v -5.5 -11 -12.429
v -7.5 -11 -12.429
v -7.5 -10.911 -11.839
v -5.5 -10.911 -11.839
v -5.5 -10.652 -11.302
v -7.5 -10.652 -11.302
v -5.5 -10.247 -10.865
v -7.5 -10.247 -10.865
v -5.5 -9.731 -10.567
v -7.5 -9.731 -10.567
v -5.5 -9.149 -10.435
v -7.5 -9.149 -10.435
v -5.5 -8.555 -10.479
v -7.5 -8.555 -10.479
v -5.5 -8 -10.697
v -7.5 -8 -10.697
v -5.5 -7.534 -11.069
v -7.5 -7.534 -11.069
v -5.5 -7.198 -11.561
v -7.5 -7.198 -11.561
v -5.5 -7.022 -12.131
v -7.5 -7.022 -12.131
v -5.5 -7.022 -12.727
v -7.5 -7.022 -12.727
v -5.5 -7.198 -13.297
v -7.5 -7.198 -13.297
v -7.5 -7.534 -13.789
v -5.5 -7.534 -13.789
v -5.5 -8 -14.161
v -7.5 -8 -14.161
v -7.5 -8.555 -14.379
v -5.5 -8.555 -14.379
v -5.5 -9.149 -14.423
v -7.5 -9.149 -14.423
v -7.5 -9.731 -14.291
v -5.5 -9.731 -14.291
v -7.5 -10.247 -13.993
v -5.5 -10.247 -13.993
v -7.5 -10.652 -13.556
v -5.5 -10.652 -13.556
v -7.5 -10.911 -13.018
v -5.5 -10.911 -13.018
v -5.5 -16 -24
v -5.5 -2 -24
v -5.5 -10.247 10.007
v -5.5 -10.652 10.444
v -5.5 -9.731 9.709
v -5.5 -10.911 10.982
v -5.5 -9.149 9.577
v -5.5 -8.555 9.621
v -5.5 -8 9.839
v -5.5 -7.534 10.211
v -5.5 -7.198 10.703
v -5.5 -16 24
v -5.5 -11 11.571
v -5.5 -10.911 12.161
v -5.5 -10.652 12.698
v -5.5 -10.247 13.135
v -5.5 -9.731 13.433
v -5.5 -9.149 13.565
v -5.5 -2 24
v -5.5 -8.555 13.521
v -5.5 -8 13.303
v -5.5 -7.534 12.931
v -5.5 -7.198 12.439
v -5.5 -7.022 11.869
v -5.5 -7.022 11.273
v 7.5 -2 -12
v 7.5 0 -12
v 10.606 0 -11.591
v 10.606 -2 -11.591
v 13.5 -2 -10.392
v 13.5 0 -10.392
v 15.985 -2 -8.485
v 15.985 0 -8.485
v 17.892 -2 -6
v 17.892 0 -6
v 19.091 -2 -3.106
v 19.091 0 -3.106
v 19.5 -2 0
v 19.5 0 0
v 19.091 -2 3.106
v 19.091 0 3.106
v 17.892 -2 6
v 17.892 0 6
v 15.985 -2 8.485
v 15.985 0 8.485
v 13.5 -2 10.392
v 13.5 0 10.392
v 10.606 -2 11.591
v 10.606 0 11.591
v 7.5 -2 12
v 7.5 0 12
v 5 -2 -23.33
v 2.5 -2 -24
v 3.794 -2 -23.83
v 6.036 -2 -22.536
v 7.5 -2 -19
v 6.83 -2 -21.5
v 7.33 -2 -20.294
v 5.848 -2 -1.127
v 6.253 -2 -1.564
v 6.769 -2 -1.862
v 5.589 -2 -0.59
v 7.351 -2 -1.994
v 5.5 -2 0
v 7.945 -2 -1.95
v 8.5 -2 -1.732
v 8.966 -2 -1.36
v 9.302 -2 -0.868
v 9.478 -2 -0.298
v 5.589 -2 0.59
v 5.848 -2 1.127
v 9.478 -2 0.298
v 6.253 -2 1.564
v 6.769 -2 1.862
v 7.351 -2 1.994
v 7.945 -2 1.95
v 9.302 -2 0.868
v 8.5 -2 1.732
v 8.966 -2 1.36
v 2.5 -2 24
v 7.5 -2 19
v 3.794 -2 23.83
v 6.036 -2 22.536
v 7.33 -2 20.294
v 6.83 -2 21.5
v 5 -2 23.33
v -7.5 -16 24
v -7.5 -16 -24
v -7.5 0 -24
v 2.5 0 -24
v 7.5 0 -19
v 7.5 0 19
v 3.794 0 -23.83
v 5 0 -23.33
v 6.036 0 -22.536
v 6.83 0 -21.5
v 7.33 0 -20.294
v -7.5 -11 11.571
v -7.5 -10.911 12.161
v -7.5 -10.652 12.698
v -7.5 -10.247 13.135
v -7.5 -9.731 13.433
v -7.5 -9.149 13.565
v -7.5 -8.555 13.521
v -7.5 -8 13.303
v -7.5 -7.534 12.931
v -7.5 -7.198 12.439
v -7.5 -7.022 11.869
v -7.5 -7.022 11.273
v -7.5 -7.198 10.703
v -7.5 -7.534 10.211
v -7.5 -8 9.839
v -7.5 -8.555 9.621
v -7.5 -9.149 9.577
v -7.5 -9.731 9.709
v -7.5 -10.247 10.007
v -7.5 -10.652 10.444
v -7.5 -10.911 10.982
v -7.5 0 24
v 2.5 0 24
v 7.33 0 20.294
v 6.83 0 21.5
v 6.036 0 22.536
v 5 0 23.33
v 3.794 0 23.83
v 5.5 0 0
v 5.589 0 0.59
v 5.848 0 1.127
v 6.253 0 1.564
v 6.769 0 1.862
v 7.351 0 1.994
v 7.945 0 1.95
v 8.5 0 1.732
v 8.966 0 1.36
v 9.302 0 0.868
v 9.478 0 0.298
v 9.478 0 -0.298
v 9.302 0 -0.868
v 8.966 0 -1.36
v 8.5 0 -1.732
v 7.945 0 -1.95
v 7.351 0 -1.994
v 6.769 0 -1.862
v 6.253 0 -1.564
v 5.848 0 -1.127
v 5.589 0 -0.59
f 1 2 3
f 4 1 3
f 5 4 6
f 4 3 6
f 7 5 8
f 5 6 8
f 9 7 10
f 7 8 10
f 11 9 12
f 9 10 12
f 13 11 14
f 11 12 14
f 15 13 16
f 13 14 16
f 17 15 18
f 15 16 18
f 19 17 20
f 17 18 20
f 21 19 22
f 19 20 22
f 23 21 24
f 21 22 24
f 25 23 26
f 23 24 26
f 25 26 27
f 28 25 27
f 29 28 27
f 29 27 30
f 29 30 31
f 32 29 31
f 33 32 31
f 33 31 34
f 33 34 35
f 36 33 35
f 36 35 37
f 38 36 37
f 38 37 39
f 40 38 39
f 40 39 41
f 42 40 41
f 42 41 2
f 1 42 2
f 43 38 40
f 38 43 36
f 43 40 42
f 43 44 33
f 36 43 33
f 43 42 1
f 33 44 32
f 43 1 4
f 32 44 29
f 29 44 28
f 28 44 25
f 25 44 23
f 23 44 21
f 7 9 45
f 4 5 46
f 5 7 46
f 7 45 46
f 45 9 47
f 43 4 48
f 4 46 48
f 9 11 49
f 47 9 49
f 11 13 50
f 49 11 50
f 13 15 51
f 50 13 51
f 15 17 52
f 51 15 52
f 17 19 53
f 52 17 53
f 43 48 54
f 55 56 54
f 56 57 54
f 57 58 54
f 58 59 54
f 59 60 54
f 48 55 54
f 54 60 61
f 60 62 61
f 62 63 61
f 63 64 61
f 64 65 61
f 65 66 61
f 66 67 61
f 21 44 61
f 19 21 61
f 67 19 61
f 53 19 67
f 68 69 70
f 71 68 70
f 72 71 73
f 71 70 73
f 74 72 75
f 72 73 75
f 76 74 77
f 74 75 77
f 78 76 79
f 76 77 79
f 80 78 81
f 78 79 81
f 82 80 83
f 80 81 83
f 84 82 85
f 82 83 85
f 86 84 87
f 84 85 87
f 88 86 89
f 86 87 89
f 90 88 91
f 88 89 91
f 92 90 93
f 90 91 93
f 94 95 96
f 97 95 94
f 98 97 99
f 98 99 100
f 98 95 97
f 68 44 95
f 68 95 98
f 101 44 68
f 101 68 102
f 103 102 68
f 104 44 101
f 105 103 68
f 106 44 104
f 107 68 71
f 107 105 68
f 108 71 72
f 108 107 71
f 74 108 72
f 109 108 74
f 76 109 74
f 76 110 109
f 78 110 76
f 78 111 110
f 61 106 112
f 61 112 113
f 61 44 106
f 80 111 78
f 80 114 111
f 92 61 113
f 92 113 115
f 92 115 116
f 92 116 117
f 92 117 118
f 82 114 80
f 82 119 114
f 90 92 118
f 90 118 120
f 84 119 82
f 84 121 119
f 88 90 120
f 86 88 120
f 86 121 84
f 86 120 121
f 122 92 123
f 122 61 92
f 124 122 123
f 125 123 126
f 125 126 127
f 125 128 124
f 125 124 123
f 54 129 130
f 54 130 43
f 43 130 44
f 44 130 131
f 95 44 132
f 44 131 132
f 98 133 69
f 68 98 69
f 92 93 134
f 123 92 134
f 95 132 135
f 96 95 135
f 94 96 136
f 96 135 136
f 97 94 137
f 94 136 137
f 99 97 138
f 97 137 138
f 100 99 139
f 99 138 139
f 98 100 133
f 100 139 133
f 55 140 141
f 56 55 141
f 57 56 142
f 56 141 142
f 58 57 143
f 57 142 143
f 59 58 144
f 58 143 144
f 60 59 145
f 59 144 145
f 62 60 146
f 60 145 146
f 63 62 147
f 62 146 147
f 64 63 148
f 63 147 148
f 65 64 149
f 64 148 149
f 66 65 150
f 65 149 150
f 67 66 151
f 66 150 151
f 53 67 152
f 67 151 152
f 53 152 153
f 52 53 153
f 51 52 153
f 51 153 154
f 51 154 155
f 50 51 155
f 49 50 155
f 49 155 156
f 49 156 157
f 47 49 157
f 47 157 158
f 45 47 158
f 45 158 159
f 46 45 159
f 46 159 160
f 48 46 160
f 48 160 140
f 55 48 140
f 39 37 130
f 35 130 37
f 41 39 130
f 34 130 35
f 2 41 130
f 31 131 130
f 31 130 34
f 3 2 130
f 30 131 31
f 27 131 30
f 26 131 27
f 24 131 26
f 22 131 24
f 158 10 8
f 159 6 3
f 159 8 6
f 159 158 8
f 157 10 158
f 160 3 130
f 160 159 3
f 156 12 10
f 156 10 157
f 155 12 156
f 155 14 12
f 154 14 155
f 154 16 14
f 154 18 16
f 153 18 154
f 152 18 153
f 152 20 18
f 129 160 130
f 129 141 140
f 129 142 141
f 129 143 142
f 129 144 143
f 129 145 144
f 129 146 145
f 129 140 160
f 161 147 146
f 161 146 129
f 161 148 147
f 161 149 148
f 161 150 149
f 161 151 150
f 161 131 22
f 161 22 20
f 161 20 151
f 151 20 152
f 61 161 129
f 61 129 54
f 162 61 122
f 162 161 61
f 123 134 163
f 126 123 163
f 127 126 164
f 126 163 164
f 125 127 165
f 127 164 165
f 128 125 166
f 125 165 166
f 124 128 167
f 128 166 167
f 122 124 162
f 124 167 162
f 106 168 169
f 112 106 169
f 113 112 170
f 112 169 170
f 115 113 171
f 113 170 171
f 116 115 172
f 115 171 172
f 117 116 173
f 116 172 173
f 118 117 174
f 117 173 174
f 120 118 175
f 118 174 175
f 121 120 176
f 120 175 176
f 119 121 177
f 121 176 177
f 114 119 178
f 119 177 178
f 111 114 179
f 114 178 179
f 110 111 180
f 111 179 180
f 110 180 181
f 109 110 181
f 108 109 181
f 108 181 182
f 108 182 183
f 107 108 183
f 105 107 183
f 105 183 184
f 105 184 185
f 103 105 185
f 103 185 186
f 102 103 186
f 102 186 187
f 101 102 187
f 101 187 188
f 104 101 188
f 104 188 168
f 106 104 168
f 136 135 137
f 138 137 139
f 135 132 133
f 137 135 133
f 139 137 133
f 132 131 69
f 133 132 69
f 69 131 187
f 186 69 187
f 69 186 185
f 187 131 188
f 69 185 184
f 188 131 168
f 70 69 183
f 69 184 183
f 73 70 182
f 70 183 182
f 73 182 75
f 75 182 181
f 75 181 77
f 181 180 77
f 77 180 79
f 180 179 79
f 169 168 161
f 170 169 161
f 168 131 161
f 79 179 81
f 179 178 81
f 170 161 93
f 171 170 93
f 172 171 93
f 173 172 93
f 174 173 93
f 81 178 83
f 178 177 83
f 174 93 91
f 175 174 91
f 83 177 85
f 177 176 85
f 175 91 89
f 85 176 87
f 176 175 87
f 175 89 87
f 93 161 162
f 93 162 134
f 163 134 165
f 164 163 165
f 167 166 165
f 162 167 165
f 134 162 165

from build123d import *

# Parameters (mm, degrees)
F0_W     = 2
F0_H     = 48
F1_DEPTH = 16
F2_DEPTH = 2
F4_D     = 4
F6_D     = 4


with BuildPart() as f1:
    # F0 (on Front) → F1 (new body)
    with BuildSketch(Plane.XZ):
        with Locations((-6.5, 0)):
            Rectangle(F0_W, F0_H)
    extrude(amount=F1_DEPTH)

    # F0 (on Front) → F2 (join)
    with BuildSketch(Plane.XZ):
        with Locations((-6.5, 0)):
            Rectangle(F0_W, F0_H)
        with BuildLine():
            Line((-5.5, 24), (-5.5, -24))
            Line((-5.5, -24), (2.5, -24))
            ThreePointArc((2.5, -24), (6.035534, -22.535534), (7.5, -19))
            Line((7.5, -19), (7.5, -12))
            Line((7.5, -12), (7.5, 12))
            Line((7.5, 12), (7.5, 19))
            ThreePointArc((7.5, 19), (6.035534, 22.535534), (2.5, 24))
            Line((2.5, 24), (-5.5, 24))
        make_face()
        with BuildLine():
            Line((7.5, 12), (7.5, -12))
            ThreePointArc((7.5, -12), (19.5, 0), (7.5, 12))
        make_face()
    extrude(amount=F2_DEPTH)

    # F4 (through all)
    with Locations(Plane.XZ.offset(2)):
        with Locations((7.5, 0)):
            Hole(F4_D / 2)

    # F6 (through all)
    with Locations(Plane.YZ.offset(-5.5)):
        with Locations((-9, -12.428912), (-9, 11.571088)):
            Hole(F6_D / 2)


solid = f1.part
